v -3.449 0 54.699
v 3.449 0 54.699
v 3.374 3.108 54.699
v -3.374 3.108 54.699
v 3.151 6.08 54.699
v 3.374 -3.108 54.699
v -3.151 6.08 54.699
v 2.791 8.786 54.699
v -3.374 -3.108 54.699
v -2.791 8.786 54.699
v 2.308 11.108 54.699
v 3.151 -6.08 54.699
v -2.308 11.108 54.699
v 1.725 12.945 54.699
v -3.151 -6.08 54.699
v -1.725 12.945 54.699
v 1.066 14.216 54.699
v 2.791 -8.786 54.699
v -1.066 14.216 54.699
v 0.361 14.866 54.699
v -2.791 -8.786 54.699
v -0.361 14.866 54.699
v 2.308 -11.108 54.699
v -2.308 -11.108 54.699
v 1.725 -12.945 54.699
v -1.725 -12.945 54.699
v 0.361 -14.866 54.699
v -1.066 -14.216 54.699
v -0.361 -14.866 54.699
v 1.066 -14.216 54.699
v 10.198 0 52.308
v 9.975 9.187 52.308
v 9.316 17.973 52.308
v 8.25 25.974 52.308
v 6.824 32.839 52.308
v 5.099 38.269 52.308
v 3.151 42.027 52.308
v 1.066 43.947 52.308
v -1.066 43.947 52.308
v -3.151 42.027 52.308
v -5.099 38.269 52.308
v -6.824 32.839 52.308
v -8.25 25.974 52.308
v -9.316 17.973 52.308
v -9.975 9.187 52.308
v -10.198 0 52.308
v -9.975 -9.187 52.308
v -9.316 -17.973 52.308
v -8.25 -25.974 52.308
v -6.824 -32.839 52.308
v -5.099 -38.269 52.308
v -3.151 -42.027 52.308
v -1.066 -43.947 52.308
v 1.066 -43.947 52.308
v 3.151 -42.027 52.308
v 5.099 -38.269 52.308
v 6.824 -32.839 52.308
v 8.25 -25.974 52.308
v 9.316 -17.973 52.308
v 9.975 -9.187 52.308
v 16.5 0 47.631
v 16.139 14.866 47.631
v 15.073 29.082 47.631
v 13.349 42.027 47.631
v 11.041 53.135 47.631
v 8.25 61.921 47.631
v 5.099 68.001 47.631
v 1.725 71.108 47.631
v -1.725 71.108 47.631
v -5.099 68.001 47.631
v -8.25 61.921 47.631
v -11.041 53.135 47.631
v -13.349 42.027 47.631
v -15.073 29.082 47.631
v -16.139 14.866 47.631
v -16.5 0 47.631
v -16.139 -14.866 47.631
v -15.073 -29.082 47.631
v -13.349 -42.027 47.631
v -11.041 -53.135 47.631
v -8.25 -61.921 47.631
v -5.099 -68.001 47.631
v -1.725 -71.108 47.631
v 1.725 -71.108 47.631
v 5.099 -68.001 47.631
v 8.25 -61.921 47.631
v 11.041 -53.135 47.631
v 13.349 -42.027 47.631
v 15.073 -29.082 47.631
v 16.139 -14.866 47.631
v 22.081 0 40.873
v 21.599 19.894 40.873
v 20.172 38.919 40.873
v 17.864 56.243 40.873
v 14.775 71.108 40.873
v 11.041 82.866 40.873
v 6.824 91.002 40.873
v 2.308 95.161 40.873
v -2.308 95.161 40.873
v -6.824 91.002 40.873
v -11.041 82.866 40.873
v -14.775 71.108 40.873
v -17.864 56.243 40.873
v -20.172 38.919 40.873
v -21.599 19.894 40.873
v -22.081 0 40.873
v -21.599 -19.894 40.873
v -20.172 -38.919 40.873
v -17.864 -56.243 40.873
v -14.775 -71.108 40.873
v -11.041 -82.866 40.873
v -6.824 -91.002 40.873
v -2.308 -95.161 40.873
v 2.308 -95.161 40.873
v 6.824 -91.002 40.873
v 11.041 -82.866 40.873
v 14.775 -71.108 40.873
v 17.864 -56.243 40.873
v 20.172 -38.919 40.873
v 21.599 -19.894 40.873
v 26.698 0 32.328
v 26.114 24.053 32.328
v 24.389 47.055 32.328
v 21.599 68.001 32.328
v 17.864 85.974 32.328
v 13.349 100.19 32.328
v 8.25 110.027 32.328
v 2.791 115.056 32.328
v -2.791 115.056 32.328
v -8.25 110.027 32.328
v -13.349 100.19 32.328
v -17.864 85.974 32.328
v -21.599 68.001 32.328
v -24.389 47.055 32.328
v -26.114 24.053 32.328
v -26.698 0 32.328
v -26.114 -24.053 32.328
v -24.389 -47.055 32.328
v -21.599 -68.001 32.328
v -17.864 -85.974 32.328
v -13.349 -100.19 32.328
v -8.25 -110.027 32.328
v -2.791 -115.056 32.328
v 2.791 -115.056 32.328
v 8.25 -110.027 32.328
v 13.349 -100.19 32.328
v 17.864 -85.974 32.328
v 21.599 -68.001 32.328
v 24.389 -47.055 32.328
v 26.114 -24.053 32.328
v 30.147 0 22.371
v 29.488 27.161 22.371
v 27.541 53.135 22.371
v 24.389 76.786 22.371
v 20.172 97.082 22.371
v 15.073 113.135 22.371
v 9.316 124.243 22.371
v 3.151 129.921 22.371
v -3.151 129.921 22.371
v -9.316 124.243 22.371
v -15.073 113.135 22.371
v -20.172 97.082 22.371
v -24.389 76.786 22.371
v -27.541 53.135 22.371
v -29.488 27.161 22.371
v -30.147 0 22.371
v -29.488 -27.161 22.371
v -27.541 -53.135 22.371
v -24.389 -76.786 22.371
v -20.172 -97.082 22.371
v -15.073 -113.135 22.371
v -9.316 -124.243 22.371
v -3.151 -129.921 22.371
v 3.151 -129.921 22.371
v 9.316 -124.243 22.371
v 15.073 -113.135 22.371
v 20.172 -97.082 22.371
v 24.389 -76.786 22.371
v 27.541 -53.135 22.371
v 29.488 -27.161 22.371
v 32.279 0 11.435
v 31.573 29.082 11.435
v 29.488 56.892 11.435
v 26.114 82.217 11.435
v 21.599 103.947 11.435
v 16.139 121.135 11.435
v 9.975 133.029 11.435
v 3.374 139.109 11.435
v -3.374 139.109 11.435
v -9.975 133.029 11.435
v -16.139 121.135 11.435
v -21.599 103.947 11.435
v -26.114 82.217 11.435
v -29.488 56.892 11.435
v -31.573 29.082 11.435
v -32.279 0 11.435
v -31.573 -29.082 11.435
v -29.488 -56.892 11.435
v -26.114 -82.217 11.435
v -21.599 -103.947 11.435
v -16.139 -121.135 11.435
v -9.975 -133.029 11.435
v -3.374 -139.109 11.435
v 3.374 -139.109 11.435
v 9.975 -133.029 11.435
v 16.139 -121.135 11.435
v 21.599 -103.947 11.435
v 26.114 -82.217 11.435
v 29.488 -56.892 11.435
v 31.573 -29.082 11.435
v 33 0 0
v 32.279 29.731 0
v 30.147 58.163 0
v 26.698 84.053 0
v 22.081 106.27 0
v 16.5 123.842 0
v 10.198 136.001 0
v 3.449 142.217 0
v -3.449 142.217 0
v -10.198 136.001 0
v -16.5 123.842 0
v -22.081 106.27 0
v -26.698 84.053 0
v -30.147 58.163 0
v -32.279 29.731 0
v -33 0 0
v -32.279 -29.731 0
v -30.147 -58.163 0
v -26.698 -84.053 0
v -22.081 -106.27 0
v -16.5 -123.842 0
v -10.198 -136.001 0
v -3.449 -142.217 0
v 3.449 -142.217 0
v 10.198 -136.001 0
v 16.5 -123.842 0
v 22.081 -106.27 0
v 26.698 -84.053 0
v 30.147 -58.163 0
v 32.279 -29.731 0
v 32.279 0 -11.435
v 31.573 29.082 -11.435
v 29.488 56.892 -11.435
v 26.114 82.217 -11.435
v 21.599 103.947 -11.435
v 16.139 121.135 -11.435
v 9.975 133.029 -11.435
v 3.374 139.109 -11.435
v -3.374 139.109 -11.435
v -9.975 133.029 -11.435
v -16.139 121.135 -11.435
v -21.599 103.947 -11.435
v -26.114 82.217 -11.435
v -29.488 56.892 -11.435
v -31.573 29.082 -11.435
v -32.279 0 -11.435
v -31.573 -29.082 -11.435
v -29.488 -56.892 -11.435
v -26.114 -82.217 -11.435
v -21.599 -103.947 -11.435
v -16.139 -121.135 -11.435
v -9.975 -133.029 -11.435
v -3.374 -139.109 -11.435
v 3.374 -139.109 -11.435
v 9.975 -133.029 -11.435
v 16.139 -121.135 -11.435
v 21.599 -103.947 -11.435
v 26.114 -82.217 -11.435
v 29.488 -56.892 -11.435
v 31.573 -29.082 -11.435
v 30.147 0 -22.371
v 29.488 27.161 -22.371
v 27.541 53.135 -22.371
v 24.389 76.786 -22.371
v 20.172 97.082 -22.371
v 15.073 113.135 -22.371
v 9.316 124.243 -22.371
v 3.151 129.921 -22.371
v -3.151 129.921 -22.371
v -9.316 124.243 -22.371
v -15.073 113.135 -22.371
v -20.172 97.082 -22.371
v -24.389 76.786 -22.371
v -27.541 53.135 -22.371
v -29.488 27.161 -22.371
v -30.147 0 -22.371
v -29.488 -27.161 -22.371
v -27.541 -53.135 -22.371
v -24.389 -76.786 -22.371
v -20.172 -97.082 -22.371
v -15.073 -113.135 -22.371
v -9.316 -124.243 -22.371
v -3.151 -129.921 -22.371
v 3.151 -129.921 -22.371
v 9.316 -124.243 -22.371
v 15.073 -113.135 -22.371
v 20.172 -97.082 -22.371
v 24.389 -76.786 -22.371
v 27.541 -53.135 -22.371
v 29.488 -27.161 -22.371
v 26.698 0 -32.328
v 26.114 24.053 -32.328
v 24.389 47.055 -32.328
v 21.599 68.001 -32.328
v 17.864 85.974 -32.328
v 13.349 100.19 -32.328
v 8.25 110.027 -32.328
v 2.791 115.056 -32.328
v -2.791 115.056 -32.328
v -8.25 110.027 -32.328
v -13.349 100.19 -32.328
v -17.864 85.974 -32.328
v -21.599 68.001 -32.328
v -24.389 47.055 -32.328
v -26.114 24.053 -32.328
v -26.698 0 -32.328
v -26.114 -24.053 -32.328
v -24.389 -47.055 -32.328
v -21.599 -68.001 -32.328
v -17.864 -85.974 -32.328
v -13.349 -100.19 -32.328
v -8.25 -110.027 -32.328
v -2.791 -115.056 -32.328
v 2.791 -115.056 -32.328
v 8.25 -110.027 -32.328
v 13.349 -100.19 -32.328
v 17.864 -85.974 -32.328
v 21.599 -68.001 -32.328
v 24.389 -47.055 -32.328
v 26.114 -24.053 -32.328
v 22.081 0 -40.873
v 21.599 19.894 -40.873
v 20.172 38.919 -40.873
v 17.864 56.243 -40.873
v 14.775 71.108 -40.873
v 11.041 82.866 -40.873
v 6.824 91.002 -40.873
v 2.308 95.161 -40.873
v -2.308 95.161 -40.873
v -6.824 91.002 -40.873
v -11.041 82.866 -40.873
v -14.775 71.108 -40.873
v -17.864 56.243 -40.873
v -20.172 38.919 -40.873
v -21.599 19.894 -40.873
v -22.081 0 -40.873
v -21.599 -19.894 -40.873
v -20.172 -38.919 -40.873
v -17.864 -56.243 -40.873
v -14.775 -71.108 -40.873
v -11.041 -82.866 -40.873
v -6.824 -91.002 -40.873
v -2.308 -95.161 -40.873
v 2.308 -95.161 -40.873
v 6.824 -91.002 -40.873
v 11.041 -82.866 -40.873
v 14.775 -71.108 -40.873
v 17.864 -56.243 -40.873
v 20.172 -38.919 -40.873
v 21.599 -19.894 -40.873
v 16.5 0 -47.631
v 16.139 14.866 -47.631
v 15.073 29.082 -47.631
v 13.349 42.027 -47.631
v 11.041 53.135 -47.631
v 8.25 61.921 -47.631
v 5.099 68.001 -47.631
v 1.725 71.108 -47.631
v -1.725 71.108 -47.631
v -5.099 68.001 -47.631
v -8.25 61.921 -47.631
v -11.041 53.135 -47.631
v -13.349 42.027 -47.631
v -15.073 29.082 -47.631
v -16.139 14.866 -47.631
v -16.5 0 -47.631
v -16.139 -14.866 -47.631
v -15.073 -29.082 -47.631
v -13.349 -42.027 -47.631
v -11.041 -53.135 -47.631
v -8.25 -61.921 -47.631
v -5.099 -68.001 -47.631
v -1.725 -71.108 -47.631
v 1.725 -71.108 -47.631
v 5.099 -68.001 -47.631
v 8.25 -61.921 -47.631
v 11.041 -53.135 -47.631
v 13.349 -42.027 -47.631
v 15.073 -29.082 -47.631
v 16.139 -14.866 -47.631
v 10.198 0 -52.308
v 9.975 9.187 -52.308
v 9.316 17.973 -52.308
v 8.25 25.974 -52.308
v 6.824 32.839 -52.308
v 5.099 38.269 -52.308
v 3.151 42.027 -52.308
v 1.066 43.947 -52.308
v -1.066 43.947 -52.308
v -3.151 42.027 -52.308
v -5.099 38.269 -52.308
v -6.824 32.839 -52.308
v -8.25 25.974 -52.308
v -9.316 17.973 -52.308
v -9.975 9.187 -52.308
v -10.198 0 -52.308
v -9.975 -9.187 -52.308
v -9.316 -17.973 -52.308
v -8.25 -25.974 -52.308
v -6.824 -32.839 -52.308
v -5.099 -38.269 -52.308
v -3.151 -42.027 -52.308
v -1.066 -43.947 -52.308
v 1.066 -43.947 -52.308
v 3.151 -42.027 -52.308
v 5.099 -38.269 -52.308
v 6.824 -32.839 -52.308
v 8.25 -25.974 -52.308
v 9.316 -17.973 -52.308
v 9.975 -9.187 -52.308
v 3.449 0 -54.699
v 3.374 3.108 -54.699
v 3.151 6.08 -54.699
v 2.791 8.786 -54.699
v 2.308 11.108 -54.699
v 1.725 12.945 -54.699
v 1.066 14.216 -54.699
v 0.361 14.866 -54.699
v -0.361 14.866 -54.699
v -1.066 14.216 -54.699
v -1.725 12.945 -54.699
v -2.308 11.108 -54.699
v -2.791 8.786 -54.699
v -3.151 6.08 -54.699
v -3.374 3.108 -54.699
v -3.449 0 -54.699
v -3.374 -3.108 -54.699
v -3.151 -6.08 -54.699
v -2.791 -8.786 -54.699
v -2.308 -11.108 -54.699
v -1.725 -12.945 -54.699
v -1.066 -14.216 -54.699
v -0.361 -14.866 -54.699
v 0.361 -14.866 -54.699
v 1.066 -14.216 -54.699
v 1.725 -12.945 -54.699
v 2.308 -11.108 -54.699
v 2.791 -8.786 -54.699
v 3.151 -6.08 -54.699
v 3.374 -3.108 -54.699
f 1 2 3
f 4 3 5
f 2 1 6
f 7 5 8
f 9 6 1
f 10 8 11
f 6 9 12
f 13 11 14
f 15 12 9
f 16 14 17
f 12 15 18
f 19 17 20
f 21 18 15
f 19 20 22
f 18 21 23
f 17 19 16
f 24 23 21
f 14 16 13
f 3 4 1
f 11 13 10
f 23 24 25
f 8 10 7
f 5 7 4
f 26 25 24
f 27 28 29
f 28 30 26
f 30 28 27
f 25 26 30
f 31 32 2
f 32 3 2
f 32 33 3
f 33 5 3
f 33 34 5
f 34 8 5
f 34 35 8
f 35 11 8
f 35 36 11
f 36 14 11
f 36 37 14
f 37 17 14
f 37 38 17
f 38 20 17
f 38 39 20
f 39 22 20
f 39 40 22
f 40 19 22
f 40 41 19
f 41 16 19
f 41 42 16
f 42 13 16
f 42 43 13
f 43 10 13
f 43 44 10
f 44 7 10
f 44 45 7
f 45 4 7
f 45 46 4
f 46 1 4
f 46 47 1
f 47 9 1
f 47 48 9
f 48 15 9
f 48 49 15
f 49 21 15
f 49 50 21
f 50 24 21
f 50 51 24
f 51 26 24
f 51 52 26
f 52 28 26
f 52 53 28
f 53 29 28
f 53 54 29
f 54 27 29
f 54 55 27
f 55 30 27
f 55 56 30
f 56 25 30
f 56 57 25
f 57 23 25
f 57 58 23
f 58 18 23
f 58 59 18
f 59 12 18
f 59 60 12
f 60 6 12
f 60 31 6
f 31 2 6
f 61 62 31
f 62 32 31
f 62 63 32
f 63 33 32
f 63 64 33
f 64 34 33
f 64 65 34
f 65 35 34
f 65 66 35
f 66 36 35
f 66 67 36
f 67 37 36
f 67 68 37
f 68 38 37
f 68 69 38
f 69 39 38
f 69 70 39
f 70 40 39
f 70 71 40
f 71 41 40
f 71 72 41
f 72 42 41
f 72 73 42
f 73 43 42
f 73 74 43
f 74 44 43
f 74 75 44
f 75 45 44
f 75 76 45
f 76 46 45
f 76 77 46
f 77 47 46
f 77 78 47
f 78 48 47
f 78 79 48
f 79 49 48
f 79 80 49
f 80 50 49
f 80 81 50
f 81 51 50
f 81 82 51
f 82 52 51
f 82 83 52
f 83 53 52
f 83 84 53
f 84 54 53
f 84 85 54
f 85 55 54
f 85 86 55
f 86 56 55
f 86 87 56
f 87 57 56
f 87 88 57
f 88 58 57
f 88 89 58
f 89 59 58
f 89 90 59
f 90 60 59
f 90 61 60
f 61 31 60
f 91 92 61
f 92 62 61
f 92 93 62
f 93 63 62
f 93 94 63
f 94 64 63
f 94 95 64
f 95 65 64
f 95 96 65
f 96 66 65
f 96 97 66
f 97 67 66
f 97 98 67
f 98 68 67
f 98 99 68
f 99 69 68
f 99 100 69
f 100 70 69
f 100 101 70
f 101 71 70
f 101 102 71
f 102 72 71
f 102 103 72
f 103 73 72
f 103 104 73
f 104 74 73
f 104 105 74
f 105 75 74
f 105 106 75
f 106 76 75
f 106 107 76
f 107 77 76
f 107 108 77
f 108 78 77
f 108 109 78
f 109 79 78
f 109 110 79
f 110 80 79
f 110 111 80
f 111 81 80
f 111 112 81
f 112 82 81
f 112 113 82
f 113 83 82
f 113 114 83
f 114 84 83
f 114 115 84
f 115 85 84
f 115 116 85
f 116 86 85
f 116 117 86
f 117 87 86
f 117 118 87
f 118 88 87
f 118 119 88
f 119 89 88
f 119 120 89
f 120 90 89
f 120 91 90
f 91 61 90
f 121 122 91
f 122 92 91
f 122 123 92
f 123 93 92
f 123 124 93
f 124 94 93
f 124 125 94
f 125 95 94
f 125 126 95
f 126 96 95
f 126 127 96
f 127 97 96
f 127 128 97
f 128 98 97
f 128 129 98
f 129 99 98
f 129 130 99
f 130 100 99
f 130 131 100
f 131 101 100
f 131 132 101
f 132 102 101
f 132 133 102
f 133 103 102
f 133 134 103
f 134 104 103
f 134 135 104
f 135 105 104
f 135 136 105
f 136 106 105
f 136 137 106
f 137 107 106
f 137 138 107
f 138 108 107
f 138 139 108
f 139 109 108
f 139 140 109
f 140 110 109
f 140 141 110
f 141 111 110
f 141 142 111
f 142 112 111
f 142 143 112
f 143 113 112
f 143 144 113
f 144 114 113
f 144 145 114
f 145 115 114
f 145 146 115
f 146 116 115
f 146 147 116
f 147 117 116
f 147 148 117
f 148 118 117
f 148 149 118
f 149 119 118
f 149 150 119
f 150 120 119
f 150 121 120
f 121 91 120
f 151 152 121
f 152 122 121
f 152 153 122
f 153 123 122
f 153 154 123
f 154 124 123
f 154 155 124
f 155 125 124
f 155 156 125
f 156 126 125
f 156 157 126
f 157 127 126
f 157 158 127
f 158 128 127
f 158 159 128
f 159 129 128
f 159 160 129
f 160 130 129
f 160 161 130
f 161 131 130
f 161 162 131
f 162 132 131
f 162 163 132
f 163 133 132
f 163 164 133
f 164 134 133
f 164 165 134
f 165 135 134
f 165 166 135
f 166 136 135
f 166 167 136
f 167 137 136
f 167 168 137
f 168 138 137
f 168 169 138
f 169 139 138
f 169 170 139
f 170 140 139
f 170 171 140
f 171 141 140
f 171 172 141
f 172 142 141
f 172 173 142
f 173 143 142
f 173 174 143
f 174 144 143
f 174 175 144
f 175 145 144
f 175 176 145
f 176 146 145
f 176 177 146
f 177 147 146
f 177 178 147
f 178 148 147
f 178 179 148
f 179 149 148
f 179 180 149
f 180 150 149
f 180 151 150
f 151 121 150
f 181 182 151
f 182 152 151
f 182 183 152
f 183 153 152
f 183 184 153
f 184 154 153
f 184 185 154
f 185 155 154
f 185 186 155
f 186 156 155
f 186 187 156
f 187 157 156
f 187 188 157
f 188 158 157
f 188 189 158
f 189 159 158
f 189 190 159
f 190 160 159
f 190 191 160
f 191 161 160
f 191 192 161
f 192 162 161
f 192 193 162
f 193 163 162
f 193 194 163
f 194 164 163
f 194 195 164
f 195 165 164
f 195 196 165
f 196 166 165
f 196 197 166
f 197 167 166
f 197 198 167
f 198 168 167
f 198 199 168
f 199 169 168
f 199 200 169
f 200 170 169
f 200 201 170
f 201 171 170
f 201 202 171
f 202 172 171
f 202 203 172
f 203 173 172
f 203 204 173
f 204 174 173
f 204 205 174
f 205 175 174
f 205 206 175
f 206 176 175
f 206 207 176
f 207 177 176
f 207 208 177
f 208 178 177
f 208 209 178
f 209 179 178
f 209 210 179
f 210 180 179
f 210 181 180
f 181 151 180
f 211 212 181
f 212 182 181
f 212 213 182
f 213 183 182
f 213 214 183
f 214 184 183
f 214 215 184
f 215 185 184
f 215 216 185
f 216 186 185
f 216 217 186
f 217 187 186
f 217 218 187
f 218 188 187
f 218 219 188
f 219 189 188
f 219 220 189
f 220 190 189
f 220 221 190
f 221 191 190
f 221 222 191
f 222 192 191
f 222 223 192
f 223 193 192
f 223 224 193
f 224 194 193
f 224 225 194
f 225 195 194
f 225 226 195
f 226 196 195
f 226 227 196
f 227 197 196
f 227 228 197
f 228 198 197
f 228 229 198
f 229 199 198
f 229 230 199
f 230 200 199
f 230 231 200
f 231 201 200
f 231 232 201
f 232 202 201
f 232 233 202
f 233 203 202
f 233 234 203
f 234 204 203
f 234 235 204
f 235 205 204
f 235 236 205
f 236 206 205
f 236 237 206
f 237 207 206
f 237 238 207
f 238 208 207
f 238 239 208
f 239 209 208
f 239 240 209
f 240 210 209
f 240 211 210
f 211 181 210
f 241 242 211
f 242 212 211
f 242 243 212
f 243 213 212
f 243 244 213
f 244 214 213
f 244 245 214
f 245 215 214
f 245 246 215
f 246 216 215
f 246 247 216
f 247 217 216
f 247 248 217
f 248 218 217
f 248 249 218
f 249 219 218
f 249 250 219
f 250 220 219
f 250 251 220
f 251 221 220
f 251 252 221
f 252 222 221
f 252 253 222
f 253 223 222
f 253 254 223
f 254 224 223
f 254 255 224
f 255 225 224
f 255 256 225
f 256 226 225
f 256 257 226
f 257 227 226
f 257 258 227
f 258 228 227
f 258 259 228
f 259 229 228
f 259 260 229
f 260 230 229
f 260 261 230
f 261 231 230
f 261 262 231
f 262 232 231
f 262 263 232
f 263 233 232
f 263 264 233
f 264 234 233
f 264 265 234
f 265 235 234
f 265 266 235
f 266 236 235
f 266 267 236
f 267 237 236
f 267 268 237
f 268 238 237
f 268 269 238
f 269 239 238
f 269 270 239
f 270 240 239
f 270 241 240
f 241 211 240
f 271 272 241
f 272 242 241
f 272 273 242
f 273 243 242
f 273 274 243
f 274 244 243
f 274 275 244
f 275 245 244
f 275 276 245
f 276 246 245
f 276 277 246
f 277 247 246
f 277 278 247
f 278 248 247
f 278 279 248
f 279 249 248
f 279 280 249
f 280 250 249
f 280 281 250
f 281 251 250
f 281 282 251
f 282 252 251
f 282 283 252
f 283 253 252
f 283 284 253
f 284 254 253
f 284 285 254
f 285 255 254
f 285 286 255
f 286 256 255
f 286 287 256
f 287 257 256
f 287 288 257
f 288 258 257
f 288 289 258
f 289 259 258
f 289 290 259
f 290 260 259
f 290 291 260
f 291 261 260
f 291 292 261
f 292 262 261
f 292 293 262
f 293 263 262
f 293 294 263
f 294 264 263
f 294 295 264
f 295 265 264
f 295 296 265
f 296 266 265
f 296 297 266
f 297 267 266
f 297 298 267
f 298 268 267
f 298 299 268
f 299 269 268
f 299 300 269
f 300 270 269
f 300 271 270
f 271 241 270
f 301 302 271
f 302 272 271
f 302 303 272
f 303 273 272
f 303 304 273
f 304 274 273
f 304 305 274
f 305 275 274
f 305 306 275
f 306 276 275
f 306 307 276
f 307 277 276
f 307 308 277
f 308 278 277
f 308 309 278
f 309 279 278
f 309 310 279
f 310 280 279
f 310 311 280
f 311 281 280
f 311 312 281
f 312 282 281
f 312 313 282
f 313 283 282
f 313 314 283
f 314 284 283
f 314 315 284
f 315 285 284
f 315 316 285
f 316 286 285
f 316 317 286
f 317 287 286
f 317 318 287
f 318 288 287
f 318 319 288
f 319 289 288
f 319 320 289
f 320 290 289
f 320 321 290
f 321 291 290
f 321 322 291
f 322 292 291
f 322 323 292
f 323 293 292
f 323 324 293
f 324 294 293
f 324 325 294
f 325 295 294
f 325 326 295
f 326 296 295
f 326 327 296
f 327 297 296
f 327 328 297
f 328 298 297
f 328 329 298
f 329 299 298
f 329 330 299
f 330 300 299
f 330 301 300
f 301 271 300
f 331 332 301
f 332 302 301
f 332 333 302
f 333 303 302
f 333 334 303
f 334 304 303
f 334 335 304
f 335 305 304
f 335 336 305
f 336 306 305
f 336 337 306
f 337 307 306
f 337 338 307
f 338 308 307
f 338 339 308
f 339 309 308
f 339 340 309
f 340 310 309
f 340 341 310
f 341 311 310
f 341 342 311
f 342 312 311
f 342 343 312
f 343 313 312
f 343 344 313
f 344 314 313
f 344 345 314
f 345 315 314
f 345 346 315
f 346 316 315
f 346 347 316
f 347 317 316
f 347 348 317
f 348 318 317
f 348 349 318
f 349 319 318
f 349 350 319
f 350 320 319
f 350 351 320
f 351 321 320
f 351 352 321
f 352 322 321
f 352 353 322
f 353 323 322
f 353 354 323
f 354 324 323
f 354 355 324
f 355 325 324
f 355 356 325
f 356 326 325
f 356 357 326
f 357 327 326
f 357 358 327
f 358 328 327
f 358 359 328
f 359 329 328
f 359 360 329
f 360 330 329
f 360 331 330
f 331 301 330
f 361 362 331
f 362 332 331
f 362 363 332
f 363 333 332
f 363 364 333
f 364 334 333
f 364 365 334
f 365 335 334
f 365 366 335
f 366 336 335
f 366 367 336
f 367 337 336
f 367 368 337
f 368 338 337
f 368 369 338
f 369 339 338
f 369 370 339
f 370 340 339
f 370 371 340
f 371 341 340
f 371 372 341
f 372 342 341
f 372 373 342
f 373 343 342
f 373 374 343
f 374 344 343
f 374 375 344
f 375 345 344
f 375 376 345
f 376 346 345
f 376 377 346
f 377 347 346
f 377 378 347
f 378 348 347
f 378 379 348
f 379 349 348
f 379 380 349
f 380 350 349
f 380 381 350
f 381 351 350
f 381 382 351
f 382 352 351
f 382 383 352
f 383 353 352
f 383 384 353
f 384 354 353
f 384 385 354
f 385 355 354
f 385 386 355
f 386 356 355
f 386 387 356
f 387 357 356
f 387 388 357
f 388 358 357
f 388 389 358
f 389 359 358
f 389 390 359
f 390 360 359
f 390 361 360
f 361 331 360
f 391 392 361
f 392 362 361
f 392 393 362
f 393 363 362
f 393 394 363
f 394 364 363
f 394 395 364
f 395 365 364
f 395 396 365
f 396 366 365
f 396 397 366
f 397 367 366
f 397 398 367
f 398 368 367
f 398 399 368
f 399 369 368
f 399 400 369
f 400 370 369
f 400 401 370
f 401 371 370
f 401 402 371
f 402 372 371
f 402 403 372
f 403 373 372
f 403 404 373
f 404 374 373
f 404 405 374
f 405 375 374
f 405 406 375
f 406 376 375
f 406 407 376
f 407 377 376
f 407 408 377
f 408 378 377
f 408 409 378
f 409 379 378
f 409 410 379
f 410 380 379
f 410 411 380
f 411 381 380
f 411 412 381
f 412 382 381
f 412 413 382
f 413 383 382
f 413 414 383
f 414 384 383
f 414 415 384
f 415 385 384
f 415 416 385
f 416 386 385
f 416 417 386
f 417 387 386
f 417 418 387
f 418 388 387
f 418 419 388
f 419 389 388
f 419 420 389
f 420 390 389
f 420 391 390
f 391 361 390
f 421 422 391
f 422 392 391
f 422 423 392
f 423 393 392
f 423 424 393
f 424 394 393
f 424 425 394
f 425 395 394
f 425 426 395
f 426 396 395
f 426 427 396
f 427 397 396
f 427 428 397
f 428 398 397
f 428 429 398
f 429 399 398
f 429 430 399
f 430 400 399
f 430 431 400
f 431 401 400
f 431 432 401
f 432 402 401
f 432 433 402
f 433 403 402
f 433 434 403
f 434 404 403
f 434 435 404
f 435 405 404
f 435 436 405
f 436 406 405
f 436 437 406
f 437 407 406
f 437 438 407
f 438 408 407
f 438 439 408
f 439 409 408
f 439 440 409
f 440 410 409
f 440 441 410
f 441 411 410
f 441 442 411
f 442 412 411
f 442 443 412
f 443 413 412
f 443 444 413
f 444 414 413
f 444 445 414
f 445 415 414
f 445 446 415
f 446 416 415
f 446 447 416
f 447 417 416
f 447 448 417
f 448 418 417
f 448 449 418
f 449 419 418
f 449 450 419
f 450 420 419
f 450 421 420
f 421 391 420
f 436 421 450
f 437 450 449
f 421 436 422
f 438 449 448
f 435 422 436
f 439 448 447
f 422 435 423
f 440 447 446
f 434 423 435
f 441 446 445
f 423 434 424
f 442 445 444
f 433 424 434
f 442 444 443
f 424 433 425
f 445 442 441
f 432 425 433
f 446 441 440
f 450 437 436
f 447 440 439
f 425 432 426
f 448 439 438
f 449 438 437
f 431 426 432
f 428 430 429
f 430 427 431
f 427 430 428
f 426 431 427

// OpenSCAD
// Generated by SolidPython 1.0.1 on 2020-07-29 00:46:45


scale(v = [3, 13, 5]) {
	sphere(r = 11);
}
/***********************************************
*********      SolidPython code:      **********
************************************************
 
# import packages: SolidPython
from solid import *
from solid.utils import *
from itertools import chain, combinations, permutations


class Resize:

    def __init__(self, scad_file):
        self.scad_file = scad_file
        #self.scad_file = import_scad(scad_file)
        # cone/cylinder param:
        self.r1 = 0
        self.r2 = 0
        self.h = 0
        # rectangular prism param:
        self.w = 0
        self.l = 0
        # ellipse param:
        self.r = 0

    # import OpenScad code (file name corresponds to shape)


    # classify shape + parameters
    def assign(self, param1, param2, param3):
        if self.scad_file == 'cone.scad':
            self.r1 = param1
            self.r2 = param2
            self.h = param3
        elif self.scad_file == 'cylinder.scad':
            self.r1 = param1
            self.r2 = param2
            self.h = param3
        elif self.scad_file == 'rectangularPrism.scad':
            self.h = param1
            self.l = param2
            self.w = param3
        else:
            self.r = param1
            self.h = param2

    # resize parameters
    def iterate(self):
        x = range(3, 20, 2)
        i = 1
        if self.scad_file == 'cone.scad':
            tempList = list(permutations(x, 2))
            for temp in tempList:
                param1 = temp[0]
                param2 = temp[1]
                filepath = 'produced_scad_files/' + 'cone' + str(param1) + '_' + str(param2) + '_' + '.scad'
                scad_render_to_file(cylinder(h=param1, r1=param2, r2=0), filepath)

        elif self.scad_file == 'cylinder.scad':
            tempList = list(permutations(x, 3))
            for temp in tempList:
                param1 = temp[0]
                param2 = temp[1]
                filepath = 'produced_scad_files/' + 'cylinder' + str(param1) + '_' + str(param2) + '_' + '.scad'
                scad_render_to_file(cylinder(h=param1, r1=param2, r2=param2), filepath)

        elif self.scad_file == 'rectangularPrism.scad':
            tempList = list(permutations(x, 3))
            for temp in tempList:
                param1 = temp[0]
                param2 = temp[1]
                param3 = temp[2]
                filepath = 'produced_scad_files/' + 'rectangularPrism' + str(param1) + '_' + str(param2) + '_' + str(
                    param3) + '.scad'
                scad_render_to_file(cube(size=(param1, param2, param3)), filepath)

        elif self.scad_file == 'ellipse.scad':
            tempList = list(permutations(x, 4))
            for temp in tempList:
                param1 = temp[0]
                param2 = temp[1]
                param3 = temp[2]
                param4 = temp[3]
                filepath = 'produced_scad_files/' + 'ellipse' + str(param1) + '_' + str(param2) + '_' + str(param3) + '_' + str(param4) + '.scad'
                scad_render_to_file(scale([param1, param2, param3])(sphere(r=param4)), filepath)

    def render_to_scadfile(self):
        scad_render_to_file(scad, 'example.scad') 
 
************************************************/
